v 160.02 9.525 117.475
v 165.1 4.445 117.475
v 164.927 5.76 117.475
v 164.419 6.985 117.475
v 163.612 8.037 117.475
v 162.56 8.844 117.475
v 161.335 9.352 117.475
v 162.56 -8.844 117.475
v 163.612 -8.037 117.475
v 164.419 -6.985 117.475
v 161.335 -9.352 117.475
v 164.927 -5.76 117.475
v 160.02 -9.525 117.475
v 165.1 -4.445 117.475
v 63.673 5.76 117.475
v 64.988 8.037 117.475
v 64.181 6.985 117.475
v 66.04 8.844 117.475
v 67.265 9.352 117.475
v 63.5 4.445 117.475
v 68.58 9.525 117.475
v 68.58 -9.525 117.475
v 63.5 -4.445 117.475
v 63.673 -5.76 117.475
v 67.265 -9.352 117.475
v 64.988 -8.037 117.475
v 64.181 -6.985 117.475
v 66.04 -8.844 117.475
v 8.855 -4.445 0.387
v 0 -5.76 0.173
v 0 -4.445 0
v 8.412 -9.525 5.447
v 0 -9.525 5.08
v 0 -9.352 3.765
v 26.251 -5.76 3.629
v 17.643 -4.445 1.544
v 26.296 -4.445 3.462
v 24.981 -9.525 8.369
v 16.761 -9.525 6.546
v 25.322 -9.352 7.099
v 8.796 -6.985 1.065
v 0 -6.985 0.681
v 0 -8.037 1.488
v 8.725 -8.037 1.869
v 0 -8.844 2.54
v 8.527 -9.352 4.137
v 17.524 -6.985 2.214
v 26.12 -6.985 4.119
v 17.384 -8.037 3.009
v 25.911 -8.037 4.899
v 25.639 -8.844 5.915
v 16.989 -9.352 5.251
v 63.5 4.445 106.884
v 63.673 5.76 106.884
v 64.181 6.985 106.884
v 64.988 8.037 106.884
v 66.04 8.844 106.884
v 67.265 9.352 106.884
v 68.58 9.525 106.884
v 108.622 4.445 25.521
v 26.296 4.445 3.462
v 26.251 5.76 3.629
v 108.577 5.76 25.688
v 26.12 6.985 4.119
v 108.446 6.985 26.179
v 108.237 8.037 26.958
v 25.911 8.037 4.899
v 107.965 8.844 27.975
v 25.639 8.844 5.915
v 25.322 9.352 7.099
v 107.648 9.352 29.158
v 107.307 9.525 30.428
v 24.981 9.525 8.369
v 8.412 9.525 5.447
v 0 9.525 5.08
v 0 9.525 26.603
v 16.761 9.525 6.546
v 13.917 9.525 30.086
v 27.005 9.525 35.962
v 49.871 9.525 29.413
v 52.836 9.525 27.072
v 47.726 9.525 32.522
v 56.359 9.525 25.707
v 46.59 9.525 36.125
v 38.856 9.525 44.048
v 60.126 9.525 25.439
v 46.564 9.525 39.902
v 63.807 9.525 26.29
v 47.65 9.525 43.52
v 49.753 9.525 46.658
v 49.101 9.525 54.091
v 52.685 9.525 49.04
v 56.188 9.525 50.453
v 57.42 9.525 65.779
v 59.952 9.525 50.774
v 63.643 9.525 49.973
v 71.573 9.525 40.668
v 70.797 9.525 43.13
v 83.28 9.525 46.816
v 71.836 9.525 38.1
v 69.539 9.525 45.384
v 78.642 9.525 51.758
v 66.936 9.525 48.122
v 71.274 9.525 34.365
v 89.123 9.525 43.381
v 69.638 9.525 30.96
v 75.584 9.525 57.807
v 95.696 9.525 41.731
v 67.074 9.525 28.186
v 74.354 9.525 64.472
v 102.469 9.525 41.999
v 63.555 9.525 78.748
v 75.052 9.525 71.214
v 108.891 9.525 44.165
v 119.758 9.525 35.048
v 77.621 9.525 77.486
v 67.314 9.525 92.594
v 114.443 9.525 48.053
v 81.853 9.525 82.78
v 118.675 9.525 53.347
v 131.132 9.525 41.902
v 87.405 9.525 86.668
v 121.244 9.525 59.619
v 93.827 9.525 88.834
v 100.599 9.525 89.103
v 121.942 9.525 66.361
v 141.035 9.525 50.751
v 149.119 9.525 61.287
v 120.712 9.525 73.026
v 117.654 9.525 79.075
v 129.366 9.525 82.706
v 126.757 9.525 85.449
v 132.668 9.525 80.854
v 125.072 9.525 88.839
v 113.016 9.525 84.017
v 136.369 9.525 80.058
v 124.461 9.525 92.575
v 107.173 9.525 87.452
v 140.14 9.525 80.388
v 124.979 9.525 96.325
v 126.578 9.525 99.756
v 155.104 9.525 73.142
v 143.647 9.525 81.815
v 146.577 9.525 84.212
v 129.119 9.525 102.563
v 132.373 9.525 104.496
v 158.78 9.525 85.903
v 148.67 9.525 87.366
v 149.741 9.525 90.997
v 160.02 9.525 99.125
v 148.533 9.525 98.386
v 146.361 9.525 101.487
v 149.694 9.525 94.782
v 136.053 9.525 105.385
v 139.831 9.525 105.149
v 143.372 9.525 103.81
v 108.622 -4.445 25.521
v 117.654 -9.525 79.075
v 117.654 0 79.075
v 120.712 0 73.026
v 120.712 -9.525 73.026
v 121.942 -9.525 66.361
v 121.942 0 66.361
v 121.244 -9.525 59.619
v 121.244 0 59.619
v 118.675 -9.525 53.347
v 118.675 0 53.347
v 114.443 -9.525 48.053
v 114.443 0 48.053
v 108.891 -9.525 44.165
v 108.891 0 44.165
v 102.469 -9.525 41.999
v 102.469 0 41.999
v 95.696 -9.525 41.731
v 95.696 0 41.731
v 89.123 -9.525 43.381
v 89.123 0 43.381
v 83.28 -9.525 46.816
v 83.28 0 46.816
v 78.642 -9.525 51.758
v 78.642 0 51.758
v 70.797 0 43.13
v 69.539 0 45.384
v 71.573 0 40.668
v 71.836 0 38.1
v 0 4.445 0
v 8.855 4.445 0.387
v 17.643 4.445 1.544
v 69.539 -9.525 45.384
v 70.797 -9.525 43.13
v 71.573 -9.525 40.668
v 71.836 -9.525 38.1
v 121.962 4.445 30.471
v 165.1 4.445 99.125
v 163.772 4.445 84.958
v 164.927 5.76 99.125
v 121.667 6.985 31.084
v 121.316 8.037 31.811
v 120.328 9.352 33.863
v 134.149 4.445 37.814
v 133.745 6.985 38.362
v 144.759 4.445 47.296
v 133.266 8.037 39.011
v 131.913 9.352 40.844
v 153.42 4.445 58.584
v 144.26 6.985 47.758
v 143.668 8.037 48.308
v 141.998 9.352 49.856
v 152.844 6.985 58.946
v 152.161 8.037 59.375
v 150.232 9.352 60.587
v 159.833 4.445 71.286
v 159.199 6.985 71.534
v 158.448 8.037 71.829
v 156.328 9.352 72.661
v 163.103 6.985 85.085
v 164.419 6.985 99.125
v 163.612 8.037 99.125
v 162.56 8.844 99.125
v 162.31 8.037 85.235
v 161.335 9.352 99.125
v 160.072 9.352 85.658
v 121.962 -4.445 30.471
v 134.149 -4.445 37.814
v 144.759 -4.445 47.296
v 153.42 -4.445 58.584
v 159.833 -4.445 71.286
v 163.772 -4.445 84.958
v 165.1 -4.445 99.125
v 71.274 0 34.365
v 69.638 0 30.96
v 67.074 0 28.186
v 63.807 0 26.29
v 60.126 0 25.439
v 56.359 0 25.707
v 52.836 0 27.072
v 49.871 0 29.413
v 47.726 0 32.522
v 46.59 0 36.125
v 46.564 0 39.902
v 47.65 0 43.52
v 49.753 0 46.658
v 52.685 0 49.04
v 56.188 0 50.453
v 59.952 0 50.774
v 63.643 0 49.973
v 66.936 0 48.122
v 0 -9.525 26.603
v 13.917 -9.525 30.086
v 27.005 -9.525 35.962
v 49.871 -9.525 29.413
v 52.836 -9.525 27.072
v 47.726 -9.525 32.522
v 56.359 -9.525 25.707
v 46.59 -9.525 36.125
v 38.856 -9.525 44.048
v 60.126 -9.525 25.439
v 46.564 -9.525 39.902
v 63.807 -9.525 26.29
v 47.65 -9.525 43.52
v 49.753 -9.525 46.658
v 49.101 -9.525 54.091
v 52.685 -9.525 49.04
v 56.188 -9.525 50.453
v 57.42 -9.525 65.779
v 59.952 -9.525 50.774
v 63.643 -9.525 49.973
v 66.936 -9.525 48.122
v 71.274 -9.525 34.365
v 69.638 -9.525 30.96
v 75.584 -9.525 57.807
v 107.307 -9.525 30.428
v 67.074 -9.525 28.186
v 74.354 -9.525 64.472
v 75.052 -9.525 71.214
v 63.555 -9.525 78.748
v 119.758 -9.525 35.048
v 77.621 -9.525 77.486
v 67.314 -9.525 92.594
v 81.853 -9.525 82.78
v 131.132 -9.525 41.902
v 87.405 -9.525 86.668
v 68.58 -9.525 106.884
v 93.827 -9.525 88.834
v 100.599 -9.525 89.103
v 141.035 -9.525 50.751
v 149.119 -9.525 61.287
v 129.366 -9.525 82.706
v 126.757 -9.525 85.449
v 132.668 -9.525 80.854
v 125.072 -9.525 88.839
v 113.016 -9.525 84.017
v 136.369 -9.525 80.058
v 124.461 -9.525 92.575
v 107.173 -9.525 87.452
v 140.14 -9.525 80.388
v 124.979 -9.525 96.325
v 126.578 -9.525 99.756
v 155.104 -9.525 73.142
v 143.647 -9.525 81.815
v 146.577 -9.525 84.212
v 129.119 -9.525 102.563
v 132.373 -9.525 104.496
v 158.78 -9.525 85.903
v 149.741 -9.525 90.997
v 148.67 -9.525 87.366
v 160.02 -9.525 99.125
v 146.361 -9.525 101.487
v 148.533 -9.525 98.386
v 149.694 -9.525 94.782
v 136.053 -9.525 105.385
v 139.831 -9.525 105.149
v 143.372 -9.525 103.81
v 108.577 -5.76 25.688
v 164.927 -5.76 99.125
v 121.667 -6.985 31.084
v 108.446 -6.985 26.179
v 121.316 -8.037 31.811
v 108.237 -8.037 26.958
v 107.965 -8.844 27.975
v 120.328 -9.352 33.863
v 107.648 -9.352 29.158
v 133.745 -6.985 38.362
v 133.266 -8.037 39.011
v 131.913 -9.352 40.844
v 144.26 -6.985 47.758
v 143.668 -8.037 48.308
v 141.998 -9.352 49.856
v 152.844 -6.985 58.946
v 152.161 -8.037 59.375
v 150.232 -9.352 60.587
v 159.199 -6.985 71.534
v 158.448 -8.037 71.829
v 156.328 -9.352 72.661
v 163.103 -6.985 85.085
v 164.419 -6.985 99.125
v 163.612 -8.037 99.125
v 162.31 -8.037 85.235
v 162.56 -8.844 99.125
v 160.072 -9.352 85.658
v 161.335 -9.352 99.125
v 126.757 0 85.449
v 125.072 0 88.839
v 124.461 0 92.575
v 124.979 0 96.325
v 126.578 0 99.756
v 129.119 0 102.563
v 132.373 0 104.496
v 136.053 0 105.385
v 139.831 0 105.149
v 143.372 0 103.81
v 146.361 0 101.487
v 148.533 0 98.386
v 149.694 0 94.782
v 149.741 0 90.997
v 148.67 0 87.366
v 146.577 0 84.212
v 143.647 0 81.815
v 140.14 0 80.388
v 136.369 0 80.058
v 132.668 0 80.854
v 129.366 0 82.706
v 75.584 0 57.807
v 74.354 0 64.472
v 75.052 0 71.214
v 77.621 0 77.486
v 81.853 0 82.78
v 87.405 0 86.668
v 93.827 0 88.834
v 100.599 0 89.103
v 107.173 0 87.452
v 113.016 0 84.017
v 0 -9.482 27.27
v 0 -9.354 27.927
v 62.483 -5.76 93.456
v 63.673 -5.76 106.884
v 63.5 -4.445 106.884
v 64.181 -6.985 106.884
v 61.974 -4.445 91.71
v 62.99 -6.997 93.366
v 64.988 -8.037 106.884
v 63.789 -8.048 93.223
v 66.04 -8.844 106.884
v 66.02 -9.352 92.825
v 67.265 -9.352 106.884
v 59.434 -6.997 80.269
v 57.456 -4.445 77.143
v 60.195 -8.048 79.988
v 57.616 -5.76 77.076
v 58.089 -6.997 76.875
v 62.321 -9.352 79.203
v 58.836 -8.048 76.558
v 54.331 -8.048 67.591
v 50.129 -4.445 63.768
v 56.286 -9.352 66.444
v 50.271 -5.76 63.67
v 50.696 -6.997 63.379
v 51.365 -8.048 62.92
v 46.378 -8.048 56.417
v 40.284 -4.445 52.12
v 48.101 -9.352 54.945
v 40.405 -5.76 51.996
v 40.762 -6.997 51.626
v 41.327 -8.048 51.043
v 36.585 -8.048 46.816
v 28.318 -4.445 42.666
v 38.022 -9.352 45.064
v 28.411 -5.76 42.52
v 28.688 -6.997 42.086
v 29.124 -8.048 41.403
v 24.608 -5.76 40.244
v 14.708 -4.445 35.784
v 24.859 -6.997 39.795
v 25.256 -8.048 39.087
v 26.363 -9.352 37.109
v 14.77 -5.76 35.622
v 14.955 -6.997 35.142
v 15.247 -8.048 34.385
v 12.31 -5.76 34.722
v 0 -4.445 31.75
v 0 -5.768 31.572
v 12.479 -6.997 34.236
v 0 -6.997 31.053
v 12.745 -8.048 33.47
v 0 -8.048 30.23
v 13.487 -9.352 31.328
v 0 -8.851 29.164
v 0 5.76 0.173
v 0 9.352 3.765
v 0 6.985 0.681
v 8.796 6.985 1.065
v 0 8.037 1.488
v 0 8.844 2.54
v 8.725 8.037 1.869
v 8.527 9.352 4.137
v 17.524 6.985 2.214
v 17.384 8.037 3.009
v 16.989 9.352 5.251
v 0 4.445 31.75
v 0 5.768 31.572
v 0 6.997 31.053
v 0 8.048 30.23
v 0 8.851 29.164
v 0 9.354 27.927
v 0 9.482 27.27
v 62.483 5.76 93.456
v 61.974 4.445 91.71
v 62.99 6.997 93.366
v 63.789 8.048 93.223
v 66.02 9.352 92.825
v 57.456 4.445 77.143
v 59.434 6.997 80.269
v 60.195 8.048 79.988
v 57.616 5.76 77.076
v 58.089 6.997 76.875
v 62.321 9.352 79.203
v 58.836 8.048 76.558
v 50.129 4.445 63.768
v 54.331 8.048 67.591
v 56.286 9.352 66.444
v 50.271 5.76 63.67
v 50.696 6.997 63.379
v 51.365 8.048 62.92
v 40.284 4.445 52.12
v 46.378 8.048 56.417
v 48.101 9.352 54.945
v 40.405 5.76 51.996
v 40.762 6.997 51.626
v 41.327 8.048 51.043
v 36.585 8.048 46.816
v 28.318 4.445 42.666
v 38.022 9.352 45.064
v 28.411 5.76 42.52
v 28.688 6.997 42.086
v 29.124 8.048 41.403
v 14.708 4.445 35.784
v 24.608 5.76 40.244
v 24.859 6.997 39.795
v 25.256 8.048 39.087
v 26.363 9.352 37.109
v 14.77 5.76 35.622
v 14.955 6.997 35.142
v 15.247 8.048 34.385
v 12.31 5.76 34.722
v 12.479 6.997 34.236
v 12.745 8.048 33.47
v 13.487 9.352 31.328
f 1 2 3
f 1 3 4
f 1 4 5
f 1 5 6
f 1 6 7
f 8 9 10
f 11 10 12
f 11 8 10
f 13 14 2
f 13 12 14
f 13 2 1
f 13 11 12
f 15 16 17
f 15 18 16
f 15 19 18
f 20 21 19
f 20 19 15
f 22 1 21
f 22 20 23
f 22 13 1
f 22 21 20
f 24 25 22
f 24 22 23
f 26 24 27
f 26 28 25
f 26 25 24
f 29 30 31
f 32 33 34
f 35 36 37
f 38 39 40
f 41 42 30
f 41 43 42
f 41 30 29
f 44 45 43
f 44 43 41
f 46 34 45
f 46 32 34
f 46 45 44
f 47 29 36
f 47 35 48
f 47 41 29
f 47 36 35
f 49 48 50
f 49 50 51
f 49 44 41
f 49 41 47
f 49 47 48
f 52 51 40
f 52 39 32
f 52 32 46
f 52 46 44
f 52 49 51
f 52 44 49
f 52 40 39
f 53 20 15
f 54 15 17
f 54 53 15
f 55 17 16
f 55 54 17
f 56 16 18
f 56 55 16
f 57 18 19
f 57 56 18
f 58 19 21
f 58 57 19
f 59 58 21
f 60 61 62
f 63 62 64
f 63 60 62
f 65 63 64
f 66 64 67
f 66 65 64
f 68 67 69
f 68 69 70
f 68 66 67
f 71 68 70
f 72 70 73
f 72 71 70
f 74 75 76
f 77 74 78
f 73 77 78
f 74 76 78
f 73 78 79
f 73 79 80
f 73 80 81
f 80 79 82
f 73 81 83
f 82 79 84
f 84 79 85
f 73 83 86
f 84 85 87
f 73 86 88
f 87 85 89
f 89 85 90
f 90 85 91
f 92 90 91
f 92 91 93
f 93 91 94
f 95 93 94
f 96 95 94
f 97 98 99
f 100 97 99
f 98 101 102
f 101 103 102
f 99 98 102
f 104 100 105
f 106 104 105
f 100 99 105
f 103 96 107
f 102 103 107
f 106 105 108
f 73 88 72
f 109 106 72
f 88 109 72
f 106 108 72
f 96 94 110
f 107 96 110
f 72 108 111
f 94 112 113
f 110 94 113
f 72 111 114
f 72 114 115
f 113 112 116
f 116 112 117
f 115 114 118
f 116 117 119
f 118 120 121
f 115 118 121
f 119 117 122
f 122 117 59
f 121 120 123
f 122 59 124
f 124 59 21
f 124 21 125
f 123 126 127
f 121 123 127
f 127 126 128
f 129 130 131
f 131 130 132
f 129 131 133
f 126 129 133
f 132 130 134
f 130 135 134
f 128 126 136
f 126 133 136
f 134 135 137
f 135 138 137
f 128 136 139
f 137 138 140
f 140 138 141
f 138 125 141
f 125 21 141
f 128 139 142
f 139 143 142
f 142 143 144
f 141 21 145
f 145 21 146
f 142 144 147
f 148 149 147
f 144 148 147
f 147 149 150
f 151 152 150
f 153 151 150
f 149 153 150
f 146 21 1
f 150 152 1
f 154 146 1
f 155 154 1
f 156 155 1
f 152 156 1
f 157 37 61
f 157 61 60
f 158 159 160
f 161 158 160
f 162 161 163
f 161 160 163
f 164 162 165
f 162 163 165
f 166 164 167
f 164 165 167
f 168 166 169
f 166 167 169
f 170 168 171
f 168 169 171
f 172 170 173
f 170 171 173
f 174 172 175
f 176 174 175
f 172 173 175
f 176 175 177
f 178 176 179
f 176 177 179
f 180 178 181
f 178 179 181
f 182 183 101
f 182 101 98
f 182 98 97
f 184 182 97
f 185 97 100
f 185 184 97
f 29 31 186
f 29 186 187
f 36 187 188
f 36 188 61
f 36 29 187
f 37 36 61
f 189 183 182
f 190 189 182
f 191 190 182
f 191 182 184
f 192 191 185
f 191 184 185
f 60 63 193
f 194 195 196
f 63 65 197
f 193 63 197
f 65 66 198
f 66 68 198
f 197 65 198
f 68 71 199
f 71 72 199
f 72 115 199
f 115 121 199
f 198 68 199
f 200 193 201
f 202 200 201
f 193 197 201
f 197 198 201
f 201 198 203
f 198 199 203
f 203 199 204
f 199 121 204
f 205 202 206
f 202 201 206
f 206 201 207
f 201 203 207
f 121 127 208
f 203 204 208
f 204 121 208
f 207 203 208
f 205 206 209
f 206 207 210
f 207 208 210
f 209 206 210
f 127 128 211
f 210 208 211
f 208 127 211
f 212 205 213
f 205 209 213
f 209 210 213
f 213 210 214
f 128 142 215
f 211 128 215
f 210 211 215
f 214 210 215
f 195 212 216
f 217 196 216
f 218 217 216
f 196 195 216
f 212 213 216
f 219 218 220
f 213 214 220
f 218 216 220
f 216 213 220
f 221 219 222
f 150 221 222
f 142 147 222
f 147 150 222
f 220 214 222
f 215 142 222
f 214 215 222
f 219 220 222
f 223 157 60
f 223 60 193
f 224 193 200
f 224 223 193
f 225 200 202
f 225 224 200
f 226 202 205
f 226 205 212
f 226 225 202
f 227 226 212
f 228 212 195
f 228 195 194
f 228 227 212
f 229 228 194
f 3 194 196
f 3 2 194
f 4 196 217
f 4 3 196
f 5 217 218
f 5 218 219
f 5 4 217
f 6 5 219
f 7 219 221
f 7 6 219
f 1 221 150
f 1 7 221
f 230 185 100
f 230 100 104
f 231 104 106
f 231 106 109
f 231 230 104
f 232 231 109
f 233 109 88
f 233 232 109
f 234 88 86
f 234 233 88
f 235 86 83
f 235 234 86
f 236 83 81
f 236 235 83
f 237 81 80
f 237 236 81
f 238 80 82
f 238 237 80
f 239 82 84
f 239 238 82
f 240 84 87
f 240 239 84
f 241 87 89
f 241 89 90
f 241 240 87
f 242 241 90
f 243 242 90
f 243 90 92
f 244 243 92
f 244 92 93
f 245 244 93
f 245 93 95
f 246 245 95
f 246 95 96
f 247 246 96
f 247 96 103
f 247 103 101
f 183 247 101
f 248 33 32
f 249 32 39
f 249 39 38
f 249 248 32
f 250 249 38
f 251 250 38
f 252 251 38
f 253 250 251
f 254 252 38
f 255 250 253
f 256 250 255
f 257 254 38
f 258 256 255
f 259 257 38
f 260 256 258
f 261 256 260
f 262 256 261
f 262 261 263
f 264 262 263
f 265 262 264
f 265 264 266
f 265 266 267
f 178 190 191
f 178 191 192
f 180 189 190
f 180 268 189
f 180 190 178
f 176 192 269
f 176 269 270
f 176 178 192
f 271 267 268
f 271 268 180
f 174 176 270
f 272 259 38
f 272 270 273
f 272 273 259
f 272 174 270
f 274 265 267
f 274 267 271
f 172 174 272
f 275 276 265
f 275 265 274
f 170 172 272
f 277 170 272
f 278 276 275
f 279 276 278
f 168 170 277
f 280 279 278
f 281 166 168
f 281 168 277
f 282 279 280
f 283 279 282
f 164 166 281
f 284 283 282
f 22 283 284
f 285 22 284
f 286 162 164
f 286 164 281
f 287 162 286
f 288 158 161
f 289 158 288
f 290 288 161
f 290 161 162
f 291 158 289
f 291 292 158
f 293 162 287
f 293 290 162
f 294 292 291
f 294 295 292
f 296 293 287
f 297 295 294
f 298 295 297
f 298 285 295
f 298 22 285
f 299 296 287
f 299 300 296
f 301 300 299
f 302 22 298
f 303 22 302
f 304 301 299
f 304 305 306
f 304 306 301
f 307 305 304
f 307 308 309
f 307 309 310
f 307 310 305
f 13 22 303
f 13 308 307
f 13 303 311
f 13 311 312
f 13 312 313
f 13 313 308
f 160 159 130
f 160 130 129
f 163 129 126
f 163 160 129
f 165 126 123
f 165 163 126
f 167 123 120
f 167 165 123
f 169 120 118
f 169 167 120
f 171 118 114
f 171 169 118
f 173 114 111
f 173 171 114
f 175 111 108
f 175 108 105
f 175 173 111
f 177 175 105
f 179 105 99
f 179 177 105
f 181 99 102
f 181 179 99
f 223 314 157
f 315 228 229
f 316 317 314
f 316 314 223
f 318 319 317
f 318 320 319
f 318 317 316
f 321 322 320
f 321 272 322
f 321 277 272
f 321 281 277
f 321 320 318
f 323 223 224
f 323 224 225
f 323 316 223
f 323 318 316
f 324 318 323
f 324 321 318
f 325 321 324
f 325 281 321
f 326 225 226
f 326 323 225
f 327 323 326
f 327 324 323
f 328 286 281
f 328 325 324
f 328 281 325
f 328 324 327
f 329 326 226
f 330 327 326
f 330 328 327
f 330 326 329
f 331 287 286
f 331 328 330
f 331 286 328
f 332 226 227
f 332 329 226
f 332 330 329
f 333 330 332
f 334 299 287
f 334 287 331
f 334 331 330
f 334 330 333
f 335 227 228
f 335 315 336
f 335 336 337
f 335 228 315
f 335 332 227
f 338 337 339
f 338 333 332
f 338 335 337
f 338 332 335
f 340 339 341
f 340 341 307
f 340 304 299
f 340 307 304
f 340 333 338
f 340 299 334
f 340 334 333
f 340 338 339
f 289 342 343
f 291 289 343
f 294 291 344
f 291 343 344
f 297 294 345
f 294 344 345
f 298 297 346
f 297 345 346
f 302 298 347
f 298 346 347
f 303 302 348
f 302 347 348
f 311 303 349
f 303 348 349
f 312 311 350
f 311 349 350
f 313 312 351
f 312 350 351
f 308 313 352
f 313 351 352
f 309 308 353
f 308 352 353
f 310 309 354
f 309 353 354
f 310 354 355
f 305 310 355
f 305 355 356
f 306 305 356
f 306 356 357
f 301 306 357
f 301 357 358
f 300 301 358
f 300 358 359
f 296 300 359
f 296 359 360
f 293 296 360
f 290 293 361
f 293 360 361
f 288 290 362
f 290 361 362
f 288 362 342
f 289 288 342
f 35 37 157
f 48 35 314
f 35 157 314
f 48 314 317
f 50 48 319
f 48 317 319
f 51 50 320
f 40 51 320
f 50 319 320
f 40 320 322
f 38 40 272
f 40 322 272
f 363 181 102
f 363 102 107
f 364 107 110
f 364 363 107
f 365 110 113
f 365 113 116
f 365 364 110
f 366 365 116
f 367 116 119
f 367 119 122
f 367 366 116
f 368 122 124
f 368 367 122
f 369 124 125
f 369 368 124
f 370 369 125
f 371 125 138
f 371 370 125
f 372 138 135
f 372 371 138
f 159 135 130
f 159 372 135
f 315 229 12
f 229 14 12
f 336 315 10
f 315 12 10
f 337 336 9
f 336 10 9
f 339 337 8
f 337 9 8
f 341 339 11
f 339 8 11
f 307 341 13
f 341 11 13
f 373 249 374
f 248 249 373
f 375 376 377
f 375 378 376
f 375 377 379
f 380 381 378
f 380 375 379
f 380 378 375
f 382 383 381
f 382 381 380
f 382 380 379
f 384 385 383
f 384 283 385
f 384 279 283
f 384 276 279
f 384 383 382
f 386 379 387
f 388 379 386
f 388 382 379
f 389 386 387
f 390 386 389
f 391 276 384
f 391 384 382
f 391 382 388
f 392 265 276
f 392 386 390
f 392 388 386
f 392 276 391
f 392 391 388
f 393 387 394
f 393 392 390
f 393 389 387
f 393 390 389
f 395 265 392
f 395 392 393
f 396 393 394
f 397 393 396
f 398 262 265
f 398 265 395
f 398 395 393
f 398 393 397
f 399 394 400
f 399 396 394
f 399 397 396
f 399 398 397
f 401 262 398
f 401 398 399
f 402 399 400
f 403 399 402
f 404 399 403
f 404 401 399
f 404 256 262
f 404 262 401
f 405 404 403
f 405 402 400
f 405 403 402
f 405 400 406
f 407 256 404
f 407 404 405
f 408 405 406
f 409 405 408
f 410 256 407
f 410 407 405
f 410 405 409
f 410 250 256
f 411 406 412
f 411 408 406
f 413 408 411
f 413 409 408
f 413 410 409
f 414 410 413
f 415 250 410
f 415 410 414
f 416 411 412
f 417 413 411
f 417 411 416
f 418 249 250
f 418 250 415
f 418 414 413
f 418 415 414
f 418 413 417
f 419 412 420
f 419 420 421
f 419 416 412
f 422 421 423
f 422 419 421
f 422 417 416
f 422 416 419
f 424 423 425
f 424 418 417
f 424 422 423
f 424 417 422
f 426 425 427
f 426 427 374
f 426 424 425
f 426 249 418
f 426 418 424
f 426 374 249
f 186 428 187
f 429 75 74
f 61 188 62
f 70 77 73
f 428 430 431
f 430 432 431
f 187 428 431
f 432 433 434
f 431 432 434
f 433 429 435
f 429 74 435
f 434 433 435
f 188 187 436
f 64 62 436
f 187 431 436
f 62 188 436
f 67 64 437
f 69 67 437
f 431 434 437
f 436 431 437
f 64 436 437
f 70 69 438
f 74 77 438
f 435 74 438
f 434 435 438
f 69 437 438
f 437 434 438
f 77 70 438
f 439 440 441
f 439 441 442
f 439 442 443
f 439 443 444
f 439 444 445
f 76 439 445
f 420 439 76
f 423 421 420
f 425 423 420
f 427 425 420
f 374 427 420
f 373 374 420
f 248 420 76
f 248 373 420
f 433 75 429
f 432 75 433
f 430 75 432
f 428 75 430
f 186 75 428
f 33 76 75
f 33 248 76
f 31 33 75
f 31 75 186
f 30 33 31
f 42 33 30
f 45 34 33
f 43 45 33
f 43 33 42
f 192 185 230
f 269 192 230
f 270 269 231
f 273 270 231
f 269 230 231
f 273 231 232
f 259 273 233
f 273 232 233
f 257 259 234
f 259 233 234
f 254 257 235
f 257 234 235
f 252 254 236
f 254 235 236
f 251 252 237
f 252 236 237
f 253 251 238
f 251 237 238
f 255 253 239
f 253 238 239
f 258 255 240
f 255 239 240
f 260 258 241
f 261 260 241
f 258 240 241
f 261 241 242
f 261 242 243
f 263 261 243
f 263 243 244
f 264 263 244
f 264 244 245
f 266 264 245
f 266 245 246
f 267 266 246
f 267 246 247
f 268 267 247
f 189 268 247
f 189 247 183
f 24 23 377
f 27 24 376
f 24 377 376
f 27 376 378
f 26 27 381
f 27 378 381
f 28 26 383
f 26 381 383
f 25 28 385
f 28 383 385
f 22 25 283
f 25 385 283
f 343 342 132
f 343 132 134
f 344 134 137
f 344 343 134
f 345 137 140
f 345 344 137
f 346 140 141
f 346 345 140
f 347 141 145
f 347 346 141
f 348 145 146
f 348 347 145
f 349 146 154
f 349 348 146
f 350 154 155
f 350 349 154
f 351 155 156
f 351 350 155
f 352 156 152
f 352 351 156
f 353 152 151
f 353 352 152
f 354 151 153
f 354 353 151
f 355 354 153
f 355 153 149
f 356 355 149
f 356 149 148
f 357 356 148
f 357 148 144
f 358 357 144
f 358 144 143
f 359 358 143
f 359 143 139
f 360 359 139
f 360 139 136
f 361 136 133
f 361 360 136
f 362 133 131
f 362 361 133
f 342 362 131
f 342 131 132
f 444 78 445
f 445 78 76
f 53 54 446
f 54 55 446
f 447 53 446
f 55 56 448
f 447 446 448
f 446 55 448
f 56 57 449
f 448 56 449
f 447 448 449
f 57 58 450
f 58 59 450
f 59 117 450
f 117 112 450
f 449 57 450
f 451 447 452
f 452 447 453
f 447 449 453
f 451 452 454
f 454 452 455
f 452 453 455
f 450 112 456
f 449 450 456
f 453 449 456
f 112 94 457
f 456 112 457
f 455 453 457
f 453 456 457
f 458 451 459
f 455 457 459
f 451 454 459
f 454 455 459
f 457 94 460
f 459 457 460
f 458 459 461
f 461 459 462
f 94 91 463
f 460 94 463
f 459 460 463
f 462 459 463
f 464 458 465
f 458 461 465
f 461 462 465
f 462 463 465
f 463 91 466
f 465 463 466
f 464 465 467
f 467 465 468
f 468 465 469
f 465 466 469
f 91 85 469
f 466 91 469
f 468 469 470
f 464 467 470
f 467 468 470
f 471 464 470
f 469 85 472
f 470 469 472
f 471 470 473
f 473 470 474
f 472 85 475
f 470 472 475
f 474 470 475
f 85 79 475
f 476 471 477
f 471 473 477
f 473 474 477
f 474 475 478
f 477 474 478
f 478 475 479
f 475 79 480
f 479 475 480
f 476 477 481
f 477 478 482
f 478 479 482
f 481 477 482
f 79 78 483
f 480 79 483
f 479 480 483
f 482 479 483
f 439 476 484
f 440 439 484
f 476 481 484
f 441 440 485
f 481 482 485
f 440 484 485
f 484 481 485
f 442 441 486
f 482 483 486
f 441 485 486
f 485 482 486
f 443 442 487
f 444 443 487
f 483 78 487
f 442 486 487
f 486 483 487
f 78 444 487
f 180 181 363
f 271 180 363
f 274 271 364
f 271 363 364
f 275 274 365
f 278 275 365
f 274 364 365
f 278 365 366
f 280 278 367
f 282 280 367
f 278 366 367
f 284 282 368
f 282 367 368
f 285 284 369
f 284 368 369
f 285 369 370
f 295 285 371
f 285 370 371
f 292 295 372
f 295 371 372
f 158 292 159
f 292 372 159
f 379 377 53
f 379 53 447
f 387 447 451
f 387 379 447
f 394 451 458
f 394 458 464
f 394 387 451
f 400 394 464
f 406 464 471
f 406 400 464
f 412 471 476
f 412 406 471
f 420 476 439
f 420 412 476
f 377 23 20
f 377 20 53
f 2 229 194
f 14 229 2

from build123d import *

# Parameters (mm, degrees)
F1_DEPTH = 9.525
F2_R     = 5.08


# Not quite as in the source:
# - a feature names something its author has since deleted; it is built from what else it names


with BuildPart() as f1:
    # F0 (on Front) → F1 (new body, symmetric)
    with BuildSketch(Plane.XZ):
        with BuildLine():
            Line((0, 15.875), (0, 0))
            ThreePointArc((0, 0), (13.2614611296, 0.8692020844), (26.2960149824, 3.461936049))
            Line((26.2960149824, 3.461936049), (108.6220112368, 25.5211202615))
            ThreePointArc((108.6220112368, 25.5211202615), (149.3535245302, 52.7370473342), (165.1, 99.1246682247))
            Line((165.1, 99.1246682247), (165.1, 117.475))
            Line((165.1, 117.475), (63.5, 117.475))
            Line((63.5, 117.475), (63.5, 106.8842132454))
            ThreePointArc((63.5, 106.8842132454), (45.4987113259, 57.6973247485), (0, 31.75))
            Line((0, 31.75), (0, 15.875))
        make_face()
        with BuildLine():
            ThreePointArc((71.8357677815, 38.1), (47.023562507, 34.2810363463), (69.5389987439, 45.3844207417))
            ThreePointArc((69.5389987439, 45.3844207417), (71.247973056, 41.9189636537), (71.8357677815, 38.1))
        make_face(mode=Mode.SUBTRACT)
        with BuildLine():
            ThreePointArc((117.6539419454, 79.0748666718), (120.8582687804, 72.5771346319), (121.9603838907, 65.4165777812))
            ThreePointArc((121.9603838907, 65.4165777812), (105.3084407414, 42.7061928915), (78.6418258361, 51.7582888906))
            ThreePointArc((78.6418258361, 51.7582888906), (84.4895950001, 84.9226358359), (117.6539419454, 79.0748666718))
        make_face(mode=Mode.SUBTRACT)
        with BuildLine():
            ThreePointArc((149.86, 92.7331555624), (140.9789636537, 80.6209502879), (126.7567690375, 85.4487348208))
            ThreePointArc((126.7567690375, 85.4487348208), (133.3410363463, 104.8453608369), (149.86, 92.7331555624))
        make_face(mode=Mode.SUBTRACT)
    extrude(amount=F1_DEPTH, both=True)

    # F2
    f2_edges = [f1.edges().sort_by_distance(p)[0] for p in [
        (45.498711, -9.525, 57.697325),
        (63.5, -9.525, 112.179607),
        (63.5, 9.525, 112.179607),
        (165.1, -9.525, 108.299834),
        (149.353525, -9.525, 52.737047),
        (13.261461, 9.525, 0.869202),
    ]]
    fillet(f2_edges, radius=F2_R)


solid = f1.part
